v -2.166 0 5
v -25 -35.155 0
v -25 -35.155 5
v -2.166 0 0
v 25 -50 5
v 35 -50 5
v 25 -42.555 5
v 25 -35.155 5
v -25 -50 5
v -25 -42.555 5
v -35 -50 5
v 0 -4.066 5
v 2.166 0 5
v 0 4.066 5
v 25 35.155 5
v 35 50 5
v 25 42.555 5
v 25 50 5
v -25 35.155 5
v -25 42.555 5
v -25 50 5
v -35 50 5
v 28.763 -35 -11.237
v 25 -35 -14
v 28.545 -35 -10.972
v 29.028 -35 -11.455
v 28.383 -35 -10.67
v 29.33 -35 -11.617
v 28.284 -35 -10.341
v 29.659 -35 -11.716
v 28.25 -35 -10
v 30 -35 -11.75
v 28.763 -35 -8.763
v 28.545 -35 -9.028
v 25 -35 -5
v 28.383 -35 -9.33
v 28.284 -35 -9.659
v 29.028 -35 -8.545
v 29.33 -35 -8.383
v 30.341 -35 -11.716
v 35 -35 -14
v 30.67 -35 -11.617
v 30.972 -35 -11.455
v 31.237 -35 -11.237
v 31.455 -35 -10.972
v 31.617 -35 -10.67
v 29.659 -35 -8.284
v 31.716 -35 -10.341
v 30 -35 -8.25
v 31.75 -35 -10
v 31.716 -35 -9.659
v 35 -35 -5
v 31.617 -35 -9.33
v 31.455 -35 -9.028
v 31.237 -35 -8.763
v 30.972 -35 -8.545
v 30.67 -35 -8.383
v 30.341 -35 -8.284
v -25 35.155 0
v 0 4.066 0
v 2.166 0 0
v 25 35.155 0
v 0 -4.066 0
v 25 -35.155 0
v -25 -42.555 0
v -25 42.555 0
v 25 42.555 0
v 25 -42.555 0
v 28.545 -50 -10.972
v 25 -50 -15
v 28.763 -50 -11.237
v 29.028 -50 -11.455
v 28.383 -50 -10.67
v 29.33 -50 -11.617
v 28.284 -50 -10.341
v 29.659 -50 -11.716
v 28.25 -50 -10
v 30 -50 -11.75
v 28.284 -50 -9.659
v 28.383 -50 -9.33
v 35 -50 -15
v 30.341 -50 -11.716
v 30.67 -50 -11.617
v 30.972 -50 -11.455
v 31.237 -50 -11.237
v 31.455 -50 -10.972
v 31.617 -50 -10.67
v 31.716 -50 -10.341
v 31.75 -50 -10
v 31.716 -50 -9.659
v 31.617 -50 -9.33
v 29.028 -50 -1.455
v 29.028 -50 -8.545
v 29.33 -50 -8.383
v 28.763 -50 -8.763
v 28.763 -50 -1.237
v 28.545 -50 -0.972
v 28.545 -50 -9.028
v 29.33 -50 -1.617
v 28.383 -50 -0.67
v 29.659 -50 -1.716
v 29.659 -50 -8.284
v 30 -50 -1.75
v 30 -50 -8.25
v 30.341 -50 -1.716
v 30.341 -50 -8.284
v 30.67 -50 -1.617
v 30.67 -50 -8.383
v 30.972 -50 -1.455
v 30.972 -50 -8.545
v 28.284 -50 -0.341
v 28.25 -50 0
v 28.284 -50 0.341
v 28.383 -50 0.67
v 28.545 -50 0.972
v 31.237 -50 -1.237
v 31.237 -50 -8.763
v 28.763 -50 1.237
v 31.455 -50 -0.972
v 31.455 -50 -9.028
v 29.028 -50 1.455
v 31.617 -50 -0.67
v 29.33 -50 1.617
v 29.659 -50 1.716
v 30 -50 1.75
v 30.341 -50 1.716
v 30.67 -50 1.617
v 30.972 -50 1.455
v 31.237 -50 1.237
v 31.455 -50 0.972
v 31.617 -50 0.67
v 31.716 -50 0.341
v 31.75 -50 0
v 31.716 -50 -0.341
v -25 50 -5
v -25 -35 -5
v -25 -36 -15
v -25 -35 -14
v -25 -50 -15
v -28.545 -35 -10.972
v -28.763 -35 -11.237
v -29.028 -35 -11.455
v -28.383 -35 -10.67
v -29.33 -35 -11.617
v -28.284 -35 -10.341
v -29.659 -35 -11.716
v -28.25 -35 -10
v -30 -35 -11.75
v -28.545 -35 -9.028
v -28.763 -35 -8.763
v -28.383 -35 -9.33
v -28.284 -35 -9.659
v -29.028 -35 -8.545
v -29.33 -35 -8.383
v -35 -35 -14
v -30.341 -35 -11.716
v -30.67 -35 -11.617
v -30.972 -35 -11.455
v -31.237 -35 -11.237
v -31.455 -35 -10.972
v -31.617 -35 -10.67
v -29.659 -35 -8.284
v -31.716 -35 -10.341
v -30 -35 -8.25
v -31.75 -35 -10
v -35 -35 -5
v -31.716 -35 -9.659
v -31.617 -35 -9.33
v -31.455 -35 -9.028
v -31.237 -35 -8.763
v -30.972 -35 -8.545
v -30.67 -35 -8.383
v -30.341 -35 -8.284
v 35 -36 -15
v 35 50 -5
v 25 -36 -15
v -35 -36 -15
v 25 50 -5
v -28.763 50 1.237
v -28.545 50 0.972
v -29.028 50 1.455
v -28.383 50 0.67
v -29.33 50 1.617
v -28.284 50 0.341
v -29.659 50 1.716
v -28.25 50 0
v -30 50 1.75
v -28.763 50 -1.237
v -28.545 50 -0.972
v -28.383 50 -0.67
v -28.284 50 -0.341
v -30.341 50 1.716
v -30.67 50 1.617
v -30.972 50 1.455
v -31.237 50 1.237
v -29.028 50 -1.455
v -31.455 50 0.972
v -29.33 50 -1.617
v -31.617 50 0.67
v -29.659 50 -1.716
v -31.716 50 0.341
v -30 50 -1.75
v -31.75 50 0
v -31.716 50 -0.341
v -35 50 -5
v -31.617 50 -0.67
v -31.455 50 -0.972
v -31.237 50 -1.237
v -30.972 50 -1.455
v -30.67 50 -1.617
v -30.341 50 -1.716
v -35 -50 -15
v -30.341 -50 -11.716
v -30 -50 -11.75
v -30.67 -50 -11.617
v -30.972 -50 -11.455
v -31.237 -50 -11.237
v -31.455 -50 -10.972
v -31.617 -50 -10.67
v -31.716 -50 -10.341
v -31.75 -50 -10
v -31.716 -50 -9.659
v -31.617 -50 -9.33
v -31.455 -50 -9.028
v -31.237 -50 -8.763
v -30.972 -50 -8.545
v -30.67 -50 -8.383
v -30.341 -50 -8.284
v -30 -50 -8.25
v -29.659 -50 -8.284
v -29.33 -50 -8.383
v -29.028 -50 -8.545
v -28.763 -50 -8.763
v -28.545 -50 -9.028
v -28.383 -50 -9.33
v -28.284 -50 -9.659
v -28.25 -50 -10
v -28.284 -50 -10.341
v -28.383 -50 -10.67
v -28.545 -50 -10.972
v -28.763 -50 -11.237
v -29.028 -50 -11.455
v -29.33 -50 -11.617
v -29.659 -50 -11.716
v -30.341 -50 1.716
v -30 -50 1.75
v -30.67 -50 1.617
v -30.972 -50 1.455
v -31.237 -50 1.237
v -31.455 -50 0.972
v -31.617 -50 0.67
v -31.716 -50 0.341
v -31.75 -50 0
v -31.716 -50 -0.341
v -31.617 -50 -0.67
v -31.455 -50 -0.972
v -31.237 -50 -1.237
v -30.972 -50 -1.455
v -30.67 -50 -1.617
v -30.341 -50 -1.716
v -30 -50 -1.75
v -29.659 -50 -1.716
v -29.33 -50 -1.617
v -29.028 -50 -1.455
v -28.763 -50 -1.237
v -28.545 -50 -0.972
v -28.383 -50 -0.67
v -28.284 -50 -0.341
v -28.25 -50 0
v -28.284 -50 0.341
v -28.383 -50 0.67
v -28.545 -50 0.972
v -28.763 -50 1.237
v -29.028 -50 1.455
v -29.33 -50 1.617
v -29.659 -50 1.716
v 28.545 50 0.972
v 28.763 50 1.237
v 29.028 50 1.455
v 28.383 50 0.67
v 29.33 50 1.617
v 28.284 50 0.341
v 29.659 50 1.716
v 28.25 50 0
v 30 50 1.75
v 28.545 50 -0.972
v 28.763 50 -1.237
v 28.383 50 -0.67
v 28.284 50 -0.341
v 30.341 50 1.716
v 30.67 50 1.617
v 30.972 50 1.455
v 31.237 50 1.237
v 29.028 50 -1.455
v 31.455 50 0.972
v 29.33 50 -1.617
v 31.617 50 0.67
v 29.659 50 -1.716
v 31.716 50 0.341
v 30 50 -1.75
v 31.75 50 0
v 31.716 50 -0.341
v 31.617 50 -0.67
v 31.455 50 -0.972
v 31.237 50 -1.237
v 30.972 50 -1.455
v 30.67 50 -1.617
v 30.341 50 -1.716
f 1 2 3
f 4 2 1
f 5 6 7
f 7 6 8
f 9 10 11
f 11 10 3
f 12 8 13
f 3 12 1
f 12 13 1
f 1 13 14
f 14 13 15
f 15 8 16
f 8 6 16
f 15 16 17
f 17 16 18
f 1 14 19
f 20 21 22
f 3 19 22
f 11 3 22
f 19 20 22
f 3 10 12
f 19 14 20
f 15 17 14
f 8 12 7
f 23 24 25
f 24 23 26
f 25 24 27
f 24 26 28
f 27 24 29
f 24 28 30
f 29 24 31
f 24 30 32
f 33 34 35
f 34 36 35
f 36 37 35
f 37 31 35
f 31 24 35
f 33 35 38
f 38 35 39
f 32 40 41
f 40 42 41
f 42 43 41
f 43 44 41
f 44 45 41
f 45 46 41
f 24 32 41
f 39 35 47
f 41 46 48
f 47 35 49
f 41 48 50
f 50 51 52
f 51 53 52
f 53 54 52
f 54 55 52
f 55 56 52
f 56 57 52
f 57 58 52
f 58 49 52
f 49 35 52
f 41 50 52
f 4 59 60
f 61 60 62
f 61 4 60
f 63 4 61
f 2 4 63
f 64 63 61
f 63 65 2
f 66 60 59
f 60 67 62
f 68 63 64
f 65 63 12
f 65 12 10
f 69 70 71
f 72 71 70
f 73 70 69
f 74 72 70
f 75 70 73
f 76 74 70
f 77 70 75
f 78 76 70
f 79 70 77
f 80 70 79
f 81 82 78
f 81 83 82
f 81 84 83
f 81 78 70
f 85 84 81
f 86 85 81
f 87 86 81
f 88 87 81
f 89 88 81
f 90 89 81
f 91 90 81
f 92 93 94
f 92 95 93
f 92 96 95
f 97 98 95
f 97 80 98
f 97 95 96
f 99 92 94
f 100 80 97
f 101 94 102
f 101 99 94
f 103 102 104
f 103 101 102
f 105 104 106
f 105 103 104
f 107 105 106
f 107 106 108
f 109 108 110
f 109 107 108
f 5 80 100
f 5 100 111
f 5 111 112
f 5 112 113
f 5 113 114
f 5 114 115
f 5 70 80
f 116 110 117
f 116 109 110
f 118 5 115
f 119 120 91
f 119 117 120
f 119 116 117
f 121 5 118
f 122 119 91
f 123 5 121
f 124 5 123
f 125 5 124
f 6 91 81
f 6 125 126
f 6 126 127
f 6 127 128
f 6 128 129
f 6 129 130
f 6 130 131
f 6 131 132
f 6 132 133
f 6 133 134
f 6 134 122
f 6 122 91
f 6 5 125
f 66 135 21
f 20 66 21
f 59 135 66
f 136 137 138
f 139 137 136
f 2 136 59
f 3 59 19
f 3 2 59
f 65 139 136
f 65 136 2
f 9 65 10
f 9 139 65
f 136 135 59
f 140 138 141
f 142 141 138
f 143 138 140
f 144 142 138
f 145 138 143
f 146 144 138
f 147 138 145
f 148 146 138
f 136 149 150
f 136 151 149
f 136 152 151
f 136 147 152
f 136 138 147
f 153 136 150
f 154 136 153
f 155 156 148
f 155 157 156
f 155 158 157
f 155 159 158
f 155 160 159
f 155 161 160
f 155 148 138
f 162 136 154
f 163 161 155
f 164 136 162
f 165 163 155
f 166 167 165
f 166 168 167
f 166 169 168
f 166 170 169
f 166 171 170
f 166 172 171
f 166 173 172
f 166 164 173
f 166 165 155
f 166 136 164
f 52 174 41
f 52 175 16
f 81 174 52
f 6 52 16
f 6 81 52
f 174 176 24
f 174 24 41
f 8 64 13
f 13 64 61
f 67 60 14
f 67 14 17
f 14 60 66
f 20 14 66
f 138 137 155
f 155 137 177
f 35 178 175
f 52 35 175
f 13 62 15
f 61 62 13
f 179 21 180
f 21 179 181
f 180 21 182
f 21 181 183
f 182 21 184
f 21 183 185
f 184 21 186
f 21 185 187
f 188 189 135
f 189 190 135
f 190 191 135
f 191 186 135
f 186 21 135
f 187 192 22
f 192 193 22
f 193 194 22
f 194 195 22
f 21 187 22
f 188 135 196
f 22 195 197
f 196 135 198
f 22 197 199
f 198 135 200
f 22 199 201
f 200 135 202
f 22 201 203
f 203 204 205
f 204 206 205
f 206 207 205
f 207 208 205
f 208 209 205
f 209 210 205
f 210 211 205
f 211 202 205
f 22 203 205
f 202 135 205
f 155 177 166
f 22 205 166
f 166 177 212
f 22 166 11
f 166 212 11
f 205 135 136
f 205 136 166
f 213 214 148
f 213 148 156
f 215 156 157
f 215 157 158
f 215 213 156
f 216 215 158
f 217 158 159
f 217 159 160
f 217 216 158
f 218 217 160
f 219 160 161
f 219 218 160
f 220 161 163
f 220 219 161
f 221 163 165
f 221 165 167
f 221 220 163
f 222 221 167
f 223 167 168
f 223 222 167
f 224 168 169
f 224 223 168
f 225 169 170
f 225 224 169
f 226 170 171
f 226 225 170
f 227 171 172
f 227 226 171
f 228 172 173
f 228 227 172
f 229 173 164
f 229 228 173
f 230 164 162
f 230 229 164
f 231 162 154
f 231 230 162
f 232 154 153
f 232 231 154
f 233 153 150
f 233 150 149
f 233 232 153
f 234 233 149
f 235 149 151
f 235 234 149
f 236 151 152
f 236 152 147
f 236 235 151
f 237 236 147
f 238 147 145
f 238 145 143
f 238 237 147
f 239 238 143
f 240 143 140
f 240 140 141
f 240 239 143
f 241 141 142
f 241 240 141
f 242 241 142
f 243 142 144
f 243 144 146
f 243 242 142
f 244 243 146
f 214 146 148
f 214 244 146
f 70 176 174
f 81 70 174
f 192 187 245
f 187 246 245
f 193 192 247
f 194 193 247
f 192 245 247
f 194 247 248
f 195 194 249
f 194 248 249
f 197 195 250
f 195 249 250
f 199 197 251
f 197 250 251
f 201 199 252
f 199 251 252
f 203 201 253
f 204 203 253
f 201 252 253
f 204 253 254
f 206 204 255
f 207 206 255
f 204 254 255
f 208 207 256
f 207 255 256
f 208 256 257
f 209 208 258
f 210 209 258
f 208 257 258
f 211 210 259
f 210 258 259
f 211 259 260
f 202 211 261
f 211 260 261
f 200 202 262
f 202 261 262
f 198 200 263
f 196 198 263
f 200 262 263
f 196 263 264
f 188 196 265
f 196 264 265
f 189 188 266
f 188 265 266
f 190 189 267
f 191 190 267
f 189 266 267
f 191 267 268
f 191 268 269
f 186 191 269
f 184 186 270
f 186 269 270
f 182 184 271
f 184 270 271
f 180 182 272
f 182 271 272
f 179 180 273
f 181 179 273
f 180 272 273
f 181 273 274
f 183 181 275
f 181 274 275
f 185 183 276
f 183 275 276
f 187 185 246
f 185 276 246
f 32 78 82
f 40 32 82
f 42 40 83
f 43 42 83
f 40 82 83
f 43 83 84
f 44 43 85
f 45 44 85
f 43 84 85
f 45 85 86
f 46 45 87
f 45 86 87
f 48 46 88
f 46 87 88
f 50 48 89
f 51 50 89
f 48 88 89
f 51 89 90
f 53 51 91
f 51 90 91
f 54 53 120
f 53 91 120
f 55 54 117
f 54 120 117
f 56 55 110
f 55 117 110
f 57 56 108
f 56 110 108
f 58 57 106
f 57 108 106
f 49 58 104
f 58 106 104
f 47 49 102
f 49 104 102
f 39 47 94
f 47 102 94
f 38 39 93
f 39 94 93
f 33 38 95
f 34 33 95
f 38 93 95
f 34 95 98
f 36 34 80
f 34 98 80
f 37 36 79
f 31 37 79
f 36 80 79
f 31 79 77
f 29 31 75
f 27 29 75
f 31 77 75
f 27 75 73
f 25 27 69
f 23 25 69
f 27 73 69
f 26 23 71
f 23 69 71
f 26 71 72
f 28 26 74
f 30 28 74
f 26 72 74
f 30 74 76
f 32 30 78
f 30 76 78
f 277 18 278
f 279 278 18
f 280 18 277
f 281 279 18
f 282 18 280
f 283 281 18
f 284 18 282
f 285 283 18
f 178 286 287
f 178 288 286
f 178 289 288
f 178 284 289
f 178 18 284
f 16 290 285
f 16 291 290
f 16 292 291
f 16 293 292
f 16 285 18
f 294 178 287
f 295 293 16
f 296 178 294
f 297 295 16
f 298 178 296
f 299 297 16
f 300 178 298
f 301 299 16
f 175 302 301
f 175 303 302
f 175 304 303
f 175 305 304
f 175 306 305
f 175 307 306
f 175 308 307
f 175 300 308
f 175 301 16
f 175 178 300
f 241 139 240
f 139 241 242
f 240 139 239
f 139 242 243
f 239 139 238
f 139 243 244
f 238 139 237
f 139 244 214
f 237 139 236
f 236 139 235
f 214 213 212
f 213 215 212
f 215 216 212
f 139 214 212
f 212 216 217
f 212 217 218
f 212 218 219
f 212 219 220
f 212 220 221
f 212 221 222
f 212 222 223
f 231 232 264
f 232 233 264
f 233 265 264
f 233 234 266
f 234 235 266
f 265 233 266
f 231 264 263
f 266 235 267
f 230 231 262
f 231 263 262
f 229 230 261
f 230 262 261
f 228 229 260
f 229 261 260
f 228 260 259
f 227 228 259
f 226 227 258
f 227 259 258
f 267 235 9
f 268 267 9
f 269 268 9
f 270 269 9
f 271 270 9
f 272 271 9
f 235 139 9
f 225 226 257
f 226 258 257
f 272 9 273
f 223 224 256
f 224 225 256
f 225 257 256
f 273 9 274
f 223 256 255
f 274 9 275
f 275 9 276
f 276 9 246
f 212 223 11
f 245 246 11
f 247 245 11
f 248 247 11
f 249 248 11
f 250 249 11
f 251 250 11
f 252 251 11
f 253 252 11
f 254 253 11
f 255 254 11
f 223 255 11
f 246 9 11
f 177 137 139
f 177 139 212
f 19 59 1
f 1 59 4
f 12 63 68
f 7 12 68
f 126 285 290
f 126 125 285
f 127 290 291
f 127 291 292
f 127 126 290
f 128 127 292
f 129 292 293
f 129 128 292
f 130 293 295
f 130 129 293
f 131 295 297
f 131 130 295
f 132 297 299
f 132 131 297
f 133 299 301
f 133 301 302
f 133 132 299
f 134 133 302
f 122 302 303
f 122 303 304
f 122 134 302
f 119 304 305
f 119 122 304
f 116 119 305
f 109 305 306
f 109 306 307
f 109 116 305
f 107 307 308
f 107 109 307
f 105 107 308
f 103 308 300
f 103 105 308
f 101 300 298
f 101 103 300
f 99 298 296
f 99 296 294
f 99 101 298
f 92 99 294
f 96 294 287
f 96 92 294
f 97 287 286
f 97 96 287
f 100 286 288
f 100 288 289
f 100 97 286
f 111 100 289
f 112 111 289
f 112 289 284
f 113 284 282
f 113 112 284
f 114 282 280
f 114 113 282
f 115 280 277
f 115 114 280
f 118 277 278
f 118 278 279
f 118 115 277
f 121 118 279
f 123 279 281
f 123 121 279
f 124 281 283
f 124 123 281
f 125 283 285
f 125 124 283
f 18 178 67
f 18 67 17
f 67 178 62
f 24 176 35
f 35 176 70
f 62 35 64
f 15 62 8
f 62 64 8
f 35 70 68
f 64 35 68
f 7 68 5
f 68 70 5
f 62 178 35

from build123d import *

# Parameters (mm, degrees)
CROQUIS3_W              = 10
CROQUIS3_H              = 10
CROQUIS3_R              = 1.75
SALIENTE_EXTRUIR1_DEPTH = 50
SALIENTE_EXTRUIR2_DEPTH = 5
CROQUIS9_W              = 10
CROQUIS9_H              = 10
CROQUIS9_R              = 1.75
SALIENTE_EXTRUIR4_DEPTH = 15
CHAFL_N1_SIZE           = 1


with BuildPart() as part:
    # Croquis3 → Saliente-Extruir1 (new body)
    with BuildSketch(Plane(origin=(0, 0, 0), x_dir=(1, 0, 0), z_dir=(0, 1, 0))):
        with Locations((30, 0)):
            Rectangle(CROQUIS3_W, CROQUIS3_H)
        with Locations(Location((30, 0, 0), (0, 0, 270))):
            Circle(CROQUIS3_R, mode=Mode.SUBTRACT)
    extrude(amount=SALIENTE_EXTRUIR1_DEPTH)

    # Croquis4 → Saliente-Extruir2 (add)
    with BuildSketch(Plane.XY):
        Polygon((0, 0), (0, 4.066369454), (25, 42.555355948), (25, 35.154579698), (2.165818783, 0), align=None)
    extrude(amount=SALIENTE_EXTRUIR2_DEPTH)

    # Simetría1: part across plane


with BuildPart() as part_1:
    add(part.part)
    add(part.part.mirror(Plane.ZX))

    # Croquis9 → Saliente-Extruir4 (add)
    with BuildSketch(Plane.XZ.offset(50)):
        with Locations((30, -10)):
            Rectangle(CROQUIS9_W, CROQUIS9_H)
        with Locations(Location((30, -10, 0), (0, 0, 270))):
            Circle(CROQUIS9_R, mode=Mode.SUBTRACT)
    extrude(amount=-SALIENTE_EXTRUIR4_DEPTH)

    # Chaflán1
    chafl_n1_edges = [part_1.edges().sort_by_distance(p)[0] for p in [
        (30, -35, -15),
    ]]
    chamfer(chafl_n1_edges, length=CHAFL_N1_SIZE)

    # Simetría2: part across plane


with BuildPart() as part_2:
    add(part_1.part)
    add(part_1.part.mirror(Plane(origin=(0, 0, 0), x_dir=(0, 0, 1), z_dir=(1, 0, 0))))


solid = part_2.part
